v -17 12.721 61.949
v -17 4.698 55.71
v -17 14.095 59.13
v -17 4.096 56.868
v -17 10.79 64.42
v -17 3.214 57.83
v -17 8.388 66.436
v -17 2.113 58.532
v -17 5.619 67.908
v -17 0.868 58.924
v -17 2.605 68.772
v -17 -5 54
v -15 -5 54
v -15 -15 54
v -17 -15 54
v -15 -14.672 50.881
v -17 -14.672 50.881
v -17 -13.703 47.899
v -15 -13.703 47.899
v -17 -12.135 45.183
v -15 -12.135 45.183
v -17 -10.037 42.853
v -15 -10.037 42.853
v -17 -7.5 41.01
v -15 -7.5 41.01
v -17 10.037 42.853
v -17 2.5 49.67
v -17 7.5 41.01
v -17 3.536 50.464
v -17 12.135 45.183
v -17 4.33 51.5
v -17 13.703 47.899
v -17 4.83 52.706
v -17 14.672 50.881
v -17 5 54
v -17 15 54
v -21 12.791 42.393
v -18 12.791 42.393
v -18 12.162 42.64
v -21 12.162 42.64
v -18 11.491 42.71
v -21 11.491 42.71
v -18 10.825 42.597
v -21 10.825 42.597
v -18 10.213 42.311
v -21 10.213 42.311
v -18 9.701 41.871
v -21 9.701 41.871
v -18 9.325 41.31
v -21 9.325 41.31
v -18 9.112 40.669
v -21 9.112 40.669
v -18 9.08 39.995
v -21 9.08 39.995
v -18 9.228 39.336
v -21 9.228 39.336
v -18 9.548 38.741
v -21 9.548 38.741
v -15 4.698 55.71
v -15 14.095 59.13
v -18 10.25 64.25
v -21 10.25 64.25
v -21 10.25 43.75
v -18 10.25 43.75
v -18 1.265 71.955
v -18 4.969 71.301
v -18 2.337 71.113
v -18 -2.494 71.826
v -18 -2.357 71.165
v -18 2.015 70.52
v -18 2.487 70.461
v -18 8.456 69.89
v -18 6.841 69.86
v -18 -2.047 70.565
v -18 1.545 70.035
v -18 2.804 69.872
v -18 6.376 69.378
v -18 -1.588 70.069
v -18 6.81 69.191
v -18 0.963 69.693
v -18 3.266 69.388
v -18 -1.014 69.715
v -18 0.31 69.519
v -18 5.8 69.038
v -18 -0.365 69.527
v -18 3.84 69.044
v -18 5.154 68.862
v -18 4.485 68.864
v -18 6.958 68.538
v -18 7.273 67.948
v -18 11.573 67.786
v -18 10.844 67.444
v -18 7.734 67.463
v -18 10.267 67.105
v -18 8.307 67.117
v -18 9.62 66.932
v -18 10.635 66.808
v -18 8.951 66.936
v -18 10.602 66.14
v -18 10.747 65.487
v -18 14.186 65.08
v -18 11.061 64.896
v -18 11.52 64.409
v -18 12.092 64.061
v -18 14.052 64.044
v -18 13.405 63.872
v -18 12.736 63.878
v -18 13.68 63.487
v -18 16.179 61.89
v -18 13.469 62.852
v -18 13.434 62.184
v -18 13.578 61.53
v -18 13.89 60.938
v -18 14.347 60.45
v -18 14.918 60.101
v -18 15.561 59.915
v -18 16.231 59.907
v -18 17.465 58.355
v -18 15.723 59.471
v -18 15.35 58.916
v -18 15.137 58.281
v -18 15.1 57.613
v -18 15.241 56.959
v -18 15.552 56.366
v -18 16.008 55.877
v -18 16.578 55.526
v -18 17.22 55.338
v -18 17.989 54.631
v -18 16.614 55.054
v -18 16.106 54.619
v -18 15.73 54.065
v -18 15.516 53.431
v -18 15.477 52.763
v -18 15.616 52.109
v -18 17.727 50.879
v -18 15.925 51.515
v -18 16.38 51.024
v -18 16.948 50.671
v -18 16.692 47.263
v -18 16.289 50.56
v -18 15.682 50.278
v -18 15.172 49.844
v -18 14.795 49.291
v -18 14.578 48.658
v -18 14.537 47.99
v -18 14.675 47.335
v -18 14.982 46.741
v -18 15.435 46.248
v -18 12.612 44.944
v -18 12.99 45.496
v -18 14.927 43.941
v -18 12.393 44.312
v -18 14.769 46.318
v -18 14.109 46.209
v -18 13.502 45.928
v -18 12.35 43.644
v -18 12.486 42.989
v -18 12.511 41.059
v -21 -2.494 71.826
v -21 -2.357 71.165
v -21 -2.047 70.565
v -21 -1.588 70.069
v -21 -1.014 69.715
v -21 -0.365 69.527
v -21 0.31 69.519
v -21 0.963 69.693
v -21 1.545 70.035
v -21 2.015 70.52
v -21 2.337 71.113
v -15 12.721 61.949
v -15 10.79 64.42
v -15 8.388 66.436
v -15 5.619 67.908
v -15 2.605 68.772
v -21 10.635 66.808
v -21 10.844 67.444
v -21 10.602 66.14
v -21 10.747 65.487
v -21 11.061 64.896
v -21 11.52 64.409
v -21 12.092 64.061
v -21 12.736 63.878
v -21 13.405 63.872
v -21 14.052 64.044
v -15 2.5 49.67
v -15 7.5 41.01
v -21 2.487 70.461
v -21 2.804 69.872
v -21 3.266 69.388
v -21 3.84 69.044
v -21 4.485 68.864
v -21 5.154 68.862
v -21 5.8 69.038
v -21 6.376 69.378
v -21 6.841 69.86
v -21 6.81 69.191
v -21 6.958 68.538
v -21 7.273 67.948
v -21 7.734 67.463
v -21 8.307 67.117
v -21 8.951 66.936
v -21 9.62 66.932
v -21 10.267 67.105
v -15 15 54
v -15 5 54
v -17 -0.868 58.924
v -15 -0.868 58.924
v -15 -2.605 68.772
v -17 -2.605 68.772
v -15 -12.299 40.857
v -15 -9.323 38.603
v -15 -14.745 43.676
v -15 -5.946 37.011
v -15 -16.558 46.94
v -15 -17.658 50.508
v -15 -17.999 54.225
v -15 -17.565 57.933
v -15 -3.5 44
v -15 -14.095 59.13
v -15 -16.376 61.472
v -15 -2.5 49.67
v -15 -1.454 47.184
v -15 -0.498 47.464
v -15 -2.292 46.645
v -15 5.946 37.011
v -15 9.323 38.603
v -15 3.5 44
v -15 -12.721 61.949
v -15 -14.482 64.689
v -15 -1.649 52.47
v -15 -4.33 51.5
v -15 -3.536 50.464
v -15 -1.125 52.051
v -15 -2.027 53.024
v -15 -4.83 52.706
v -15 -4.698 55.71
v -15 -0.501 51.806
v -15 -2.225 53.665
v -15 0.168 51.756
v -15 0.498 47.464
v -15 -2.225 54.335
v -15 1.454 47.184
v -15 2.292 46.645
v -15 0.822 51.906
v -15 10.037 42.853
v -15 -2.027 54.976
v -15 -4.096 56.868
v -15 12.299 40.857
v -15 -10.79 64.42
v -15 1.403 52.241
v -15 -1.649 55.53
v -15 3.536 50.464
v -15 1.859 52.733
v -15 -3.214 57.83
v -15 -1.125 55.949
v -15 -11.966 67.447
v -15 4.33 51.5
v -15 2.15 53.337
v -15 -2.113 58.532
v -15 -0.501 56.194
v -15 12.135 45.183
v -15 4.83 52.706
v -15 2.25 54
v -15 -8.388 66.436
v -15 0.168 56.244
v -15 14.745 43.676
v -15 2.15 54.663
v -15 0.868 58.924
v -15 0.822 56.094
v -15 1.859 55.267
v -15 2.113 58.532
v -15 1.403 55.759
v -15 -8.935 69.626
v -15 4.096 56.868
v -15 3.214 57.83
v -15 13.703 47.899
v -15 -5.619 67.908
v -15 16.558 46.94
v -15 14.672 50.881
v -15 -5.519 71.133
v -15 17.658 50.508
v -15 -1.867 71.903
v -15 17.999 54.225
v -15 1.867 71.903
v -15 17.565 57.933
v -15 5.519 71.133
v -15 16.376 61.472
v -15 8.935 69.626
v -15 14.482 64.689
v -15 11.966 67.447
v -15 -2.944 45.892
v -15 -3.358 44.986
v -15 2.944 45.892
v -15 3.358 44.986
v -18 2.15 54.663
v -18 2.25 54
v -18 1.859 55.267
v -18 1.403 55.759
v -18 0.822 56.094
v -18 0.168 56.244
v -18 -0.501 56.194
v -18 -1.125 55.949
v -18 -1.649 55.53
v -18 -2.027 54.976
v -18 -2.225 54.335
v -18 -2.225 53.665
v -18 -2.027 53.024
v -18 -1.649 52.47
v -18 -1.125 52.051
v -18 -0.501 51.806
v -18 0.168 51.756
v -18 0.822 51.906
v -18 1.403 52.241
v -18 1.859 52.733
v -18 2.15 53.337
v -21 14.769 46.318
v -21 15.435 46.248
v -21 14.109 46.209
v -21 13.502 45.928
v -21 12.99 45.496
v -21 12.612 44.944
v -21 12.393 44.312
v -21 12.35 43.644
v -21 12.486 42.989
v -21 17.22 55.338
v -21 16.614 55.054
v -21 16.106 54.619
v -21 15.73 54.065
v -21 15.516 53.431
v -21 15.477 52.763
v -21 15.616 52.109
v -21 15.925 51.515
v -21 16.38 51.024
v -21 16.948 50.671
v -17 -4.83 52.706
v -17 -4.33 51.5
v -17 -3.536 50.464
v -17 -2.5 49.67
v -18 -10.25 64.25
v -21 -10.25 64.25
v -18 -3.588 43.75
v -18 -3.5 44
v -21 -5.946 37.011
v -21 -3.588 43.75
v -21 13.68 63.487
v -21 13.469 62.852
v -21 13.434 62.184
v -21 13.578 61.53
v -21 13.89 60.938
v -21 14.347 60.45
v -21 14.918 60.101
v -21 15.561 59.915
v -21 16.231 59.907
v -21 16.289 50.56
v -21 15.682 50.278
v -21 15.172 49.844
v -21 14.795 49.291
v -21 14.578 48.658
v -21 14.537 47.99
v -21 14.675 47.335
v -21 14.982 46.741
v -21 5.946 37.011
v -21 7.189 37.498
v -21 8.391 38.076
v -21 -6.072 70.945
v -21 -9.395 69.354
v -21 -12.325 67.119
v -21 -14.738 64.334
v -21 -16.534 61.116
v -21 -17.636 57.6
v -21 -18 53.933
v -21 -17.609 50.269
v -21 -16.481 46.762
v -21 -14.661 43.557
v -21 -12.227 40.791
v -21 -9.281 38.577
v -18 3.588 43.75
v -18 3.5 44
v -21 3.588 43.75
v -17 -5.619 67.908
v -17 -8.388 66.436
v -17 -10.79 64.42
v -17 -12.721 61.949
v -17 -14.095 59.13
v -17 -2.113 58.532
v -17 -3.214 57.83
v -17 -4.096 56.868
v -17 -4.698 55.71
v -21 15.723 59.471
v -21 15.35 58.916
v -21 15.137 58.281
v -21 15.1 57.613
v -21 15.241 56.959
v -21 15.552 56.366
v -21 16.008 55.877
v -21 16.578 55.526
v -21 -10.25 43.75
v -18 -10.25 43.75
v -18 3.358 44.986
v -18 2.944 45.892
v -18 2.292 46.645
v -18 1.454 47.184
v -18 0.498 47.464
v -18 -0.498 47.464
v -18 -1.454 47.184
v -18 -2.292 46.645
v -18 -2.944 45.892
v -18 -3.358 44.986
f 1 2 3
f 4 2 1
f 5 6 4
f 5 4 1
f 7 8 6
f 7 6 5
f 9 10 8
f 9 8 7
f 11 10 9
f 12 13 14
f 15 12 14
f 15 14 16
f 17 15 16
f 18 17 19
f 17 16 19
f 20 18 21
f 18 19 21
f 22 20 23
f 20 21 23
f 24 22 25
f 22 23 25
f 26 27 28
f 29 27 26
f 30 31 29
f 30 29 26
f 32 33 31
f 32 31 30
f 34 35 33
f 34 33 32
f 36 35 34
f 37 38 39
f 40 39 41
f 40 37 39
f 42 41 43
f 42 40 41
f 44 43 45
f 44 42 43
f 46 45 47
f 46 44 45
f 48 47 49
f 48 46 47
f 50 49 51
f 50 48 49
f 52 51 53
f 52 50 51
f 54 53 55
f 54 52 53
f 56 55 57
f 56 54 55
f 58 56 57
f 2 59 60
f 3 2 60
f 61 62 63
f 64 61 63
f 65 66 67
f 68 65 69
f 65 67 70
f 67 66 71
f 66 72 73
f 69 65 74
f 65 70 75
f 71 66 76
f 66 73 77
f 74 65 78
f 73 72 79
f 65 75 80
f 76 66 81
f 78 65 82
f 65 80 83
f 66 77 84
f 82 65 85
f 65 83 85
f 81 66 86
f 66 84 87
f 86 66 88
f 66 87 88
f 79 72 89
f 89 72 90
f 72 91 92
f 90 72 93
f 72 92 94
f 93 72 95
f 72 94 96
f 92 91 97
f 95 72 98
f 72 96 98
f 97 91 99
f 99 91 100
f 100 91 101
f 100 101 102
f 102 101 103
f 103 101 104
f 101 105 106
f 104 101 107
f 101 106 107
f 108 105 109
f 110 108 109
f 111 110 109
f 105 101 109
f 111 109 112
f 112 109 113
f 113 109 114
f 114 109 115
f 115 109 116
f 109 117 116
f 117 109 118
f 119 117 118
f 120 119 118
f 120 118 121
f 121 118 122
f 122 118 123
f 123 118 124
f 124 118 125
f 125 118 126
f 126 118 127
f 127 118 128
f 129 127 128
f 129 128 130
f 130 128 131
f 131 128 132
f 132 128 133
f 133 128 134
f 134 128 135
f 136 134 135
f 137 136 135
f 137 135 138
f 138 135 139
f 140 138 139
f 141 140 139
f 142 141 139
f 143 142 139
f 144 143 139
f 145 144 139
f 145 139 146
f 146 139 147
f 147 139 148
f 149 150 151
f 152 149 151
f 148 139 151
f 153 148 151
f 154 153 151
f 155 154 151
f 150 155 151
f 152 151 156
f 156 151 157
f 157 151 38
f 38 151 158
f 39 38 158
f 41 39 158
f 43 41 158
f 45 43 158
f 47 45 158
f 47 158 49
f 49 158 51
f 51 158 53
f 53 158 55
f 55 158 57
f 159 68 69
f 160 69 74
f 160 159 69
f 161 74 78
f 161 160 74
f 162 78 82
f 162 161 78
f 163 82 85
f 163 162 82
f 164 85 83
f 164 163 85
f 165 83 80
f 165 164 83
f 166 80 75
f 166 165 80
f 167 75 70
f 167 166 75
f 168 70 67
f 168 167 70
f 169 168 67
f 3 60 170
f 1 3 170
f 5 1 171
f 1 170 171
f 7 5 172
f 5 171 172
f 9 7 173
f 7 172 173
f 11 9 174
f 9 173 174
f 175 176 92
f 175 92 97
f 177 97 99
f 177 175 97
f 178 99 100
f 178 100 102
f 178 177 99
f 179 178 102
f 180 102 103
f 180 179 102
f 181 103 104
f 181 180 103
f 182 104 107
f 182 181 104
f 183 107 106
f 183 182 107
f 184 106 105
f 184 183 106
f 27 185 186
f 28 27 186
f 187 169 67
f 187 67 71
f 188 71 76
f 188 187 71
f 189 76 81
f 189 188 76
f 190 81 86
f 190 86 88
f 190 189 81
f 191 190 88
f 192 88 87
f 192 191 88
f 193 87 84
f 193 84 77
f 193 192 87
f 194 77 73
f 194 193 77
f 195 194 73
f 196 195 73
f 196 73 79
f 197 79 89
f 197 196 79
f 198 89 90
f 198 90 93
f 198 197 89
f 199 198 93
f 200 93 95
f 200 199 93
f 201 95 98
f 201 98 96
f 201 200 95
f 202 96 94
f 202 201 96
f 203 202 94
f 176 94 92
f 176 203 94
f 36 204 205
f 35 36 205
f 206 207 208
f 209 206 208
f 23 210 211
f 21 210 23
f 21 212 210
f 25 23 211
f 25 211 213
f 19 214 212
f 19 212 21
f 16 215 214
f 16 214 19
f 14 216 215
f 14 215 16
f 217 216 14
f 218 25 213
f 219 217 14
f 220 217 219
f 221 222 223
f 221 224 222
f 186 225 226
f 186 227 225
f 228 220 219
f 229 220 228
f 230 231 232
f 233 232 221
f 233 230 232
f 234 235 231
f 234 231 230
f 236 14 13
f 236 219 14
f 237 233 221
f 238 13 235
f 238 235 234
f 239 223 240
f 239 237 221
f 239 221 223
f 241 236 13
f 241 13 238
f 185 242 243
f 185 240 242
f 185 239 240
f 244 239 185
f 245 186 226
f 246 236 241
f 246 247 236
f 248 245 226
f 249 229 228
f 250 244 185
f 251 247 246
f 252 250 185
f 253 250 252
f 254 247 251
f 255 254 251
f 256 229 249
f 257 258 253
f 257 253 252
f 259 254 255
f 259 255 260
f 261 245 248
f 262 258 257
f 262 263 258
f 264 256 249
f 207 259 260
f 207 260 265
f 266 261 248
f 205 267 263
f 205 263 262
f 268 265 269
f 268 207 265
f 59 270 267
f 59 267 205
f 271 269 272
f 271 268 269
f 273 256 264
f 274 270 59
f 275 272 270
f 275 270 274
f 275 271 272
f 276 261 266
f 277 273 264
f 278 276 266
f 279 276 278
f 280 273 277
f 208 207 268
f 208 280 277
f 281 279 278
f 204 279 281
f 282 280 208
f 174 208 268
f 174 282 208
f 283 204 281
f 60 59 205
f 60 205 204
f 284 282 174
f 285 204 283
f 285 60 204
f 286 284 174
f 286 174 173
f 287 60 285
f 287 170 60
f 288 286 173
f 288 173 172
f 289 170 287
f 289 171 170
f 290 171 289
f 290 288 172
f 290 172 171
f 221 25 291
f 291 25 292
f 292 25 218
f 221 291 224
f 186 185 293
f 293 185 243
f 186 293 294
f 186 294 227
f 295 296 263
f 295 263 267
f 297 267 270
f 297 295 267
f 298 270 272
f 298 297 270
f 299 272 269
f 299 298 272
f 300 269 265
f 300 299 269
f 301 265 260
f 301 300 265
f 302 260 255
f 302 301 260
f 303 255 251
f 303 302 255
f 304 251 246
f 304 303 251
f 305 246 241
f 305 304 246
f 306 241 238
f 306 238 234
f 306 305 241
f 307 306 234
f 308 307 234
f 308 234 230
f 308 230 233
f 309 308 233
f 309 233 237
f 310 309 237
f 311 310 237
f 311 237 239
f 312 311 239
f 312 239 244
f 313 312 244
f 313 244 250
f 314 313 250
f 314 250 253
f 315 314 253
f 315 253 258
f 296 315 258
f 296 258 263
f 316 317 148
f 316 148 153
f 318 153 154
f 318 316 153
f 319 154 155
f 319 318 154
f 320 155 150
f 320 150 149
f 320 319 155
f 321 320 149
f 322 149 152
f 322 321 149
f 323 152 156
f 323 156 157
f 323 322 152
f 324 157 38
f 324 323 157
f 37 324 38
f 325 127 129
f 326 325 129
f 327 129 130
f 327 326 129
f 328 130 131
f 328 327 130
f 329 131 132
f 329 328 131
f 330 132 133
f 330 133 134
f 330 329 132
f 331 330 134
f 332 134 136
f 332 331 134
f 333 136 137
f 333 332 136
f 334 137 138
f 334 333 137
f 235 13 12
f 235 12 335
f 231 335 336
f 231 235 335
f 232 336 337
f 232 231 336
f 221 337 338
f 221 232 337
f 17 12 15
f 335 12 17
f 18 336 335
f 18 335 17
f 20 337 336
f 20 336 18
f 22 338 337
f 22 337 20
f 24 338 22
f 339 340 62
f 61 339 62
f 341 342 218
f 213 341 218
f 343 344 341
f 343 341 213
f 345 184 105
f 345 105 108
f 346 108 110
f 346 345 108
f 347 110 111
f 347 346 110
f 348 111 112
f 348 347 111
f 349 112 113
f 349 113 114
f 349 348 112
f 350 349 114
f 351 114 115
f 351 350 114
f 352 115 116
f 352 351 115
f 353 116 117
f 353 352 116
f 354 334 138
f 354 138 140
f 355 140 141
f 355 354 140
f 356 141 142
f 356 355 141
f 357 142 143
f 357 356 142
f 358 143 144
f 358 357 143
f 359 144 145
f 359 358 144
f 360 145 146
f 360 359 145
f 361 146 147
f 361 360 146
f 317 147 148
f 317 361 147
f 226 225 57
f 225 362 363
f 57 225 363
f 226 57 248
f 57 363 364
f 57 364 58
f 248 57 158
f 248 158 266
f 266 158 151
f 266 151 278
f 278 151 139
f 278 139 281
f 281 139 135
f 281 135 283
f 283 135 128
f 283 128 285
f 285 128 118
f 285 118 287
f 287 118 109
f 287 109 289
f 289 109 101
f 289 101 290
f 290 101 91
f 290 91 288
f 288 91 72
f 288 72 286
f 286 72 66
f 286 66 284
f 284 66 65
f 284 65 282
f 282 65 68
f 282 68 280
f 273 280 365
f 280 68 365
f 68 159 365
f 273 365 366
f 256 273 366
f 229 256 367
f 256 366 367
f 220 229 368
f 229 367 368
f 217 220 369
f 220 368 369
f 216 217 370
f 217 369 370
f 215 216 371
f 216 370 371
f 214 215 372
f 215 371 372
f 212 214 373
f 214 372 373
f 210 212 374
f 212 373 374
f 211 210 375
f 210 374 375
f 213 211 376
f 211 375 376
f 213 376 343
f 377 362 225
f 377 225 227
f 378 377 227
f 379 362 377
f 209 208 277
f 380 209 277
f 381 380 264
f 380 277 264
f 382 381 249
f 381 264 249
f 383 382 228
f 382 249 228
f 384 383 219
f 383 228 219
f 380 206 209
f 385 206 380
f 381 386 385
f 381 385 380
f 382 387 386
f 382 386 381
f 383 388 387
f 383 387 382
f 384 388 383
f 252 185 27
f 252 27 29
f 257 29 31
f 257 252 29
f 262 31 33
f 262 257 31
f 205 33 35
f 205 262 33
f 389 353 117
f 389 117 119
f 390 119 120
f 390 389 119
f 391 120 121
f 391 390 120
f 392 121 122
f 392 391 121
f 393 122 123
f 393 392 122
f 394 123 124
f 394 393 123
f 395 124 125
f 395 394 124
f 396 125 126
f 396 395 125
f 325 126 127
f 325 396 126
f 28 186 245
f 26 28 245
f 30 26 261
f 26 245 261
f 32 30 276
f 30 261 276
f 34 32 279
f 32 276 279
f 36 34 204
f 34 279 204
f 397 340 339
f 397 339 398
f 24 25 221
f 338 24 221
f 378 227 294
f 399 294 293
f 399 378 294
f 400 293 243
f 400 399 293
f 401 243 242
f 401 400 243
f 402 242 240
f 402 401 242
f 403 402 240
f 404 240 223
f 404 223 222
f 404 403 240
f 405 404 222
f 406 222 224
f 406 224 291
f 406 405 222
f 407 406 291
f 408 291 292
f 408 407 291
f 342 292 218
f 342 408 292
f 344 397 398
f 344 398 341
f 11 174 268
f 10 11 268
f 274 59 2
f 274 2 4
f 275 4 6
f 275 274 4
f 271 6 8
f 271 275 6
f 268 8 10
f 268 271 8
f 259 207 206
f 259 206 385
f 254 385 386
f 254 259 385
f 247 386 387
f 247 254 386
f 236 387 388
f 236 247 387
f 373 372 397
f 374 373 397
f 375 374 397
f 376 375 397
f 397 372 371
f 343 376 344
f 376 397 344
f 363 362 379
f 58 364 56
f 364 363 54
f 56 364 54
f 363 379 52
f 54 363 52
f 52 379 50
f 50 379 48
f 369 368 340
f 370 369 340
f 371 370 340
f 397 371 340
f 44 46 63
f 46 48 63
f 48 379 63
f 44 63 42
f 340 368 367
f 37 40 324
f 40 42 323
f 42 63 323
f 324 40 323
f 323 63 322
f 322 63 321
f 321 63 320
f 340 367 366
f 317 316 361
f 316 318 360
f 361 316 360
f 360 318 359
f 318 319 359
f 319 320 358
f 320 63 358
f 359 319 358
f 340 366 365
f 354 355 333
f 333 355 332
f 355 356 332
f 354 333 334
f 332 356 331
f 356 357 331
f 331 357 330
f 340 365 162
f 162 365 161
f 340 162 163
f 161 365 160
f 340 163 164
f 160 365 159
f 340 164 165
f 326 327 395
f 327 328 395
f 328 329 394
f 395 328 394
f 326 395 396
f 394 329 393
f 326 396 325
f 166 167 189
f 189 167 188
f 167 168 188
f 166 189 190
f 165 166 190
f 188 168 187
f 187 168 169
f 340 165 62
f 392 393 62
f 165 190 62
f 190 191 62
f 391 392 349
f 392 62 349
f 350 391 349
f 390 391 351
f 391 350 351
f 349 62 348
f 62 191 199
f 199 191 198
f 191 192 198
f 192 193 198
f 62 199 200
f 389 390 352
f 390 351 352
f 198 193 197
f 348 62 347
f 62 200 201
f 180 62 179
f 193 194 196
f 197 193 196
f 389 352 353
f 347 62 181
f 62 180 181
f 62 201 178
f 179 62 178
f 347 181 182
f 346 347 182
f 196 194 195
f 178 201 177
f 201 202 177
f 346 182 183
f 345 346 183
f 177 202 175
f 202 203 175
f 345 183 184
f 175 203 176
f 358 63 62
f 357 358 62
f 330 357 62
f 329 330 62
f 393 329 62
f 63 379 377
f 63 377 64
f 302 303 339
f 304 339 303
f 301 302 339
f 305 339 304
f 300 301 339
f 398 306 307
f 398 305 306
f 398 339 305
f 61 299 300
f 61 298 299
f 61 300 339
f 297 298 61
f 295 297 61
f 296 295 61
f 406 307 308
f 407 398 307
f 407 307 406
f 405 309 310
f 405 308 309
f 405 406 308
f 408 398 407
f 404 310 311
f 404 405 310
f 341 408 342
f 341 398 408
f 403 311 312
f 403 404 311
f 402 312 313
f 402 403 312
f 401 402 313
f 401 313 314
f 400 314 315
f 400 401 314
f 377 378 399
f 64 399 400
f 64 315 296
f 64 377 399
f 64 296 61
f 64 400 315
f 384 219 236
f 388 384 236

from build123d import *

# Parameters (mm, degrees)
SKETCH036_R           = 2.25
PAD024_DEPTH          = 6
SKETCH038_W           = 20.5
SKETCH038_H           = 20.5
POCKET007_DEPTH       = 3
CYLINDER068_R         = 2.5
CYLINDER068_DEPTH     = 3
POLARPATTERN018_COUNT = 10
POLARPATTERN018_ANGLE = 140
POCKET009_DEPTH       = 2
POLARPATTERN019_COUNT = 4
POLARPATTERN019_ANGLE = 240


with BuildPart() as part:
    # Sketch036 → Pad024 (new body)
    with BuildSketch(Plane.YZ):
        with BuildLine():
            ThreePointArc((5.946308, -16.98945), (0, 18), (-5.946308, -16.98945))
            Line((-3.5, -10), (-5.946308, -16.98945))
            ThreePointArc((3.5, -10), (0, -6.5), (-3.5, -10))
            Line((5.946308, -16.98945), (3.5, -10))
        make_face()
        Circle(SKETCH036_R, mode=Mode.SUBTRACT)
    extrude(amount=PAD024_DEPTH)

    # Sketch038 (on Face6 of Pad024) → Pocket007 (cut)
    with BuildSketch(Plane(origin=(0, 0, 0), x_dir=(0, 1, 0), z_dir=(-1, 0, 0))):
        Rectangle(SKETCH038_W, SKETCH038_H)
    extrude(amount=-POCKET007_DEPTH, mode=Mode.SUBTRACT)

    # Cylinder068 → Cylinder068 (cut)
    with BuildSketch(Plane(origin=(0, 0, 18), x_dir=(0, 1, 0), z_dir=(1, 0, 0))):
        Circle(CYLINDER068_R)
    cylinder068 = extrude(amount=CYLINDER068_DEPTH, mode=Mode.SUBTRACT)

    # PolarPattern018: Cylinder068 ×10 about axis
    polarpattern018_axis = Axis((0, 0, 0), (-1, 0, 0))
    for i in range(1, POLARPATTERN018_COUNT):
        add(cylinder068.rotate(polarpattern018_axis, i * POLARPATTERN018_ANGLE / (POLARPATTERN018_COUNT - 1)), mode=Mode.SUBTRACT)

    # Sketch045 → Pocket009 (cut)
    with BuildSketch(Plane.YZ.offset(6)):
        with BuildLine():
            ThreePointArc((7.5, -12.990381), (12.990381, -7.5), (15, 0))
            Line((15, 0), (5, 0))
            ThreePointArc((2.5, -4.330127), (4.330127, -2.5), (5, 0))
            Line((2.5, -4.330127), (7.5, -12.990381))
        make_face()
    pocket009 = extrude(amount=-POCKET009_DEPTH, mode=Mode.SUBTRACT)

    # PolarPattern019: Pocket009 ×4 about axis
    polarpattern019_axis = Axis((6, 0, 0), (1, 0, 0))
    for i in range(1, POLARPATTERN019_COUNT):
        add(pocket009.rotate(polarpattern019_axis, i * POLARPATTERN019_ANGLE / (POLARPATTERN019_COUNT - 1)), mode=Mode.SUBTRACT)


with BuildPart() as part_1:
    # Body036 placement: moved
    add(part.part.moved(Location((-21, 0, 54))))


solid = part_1.part
